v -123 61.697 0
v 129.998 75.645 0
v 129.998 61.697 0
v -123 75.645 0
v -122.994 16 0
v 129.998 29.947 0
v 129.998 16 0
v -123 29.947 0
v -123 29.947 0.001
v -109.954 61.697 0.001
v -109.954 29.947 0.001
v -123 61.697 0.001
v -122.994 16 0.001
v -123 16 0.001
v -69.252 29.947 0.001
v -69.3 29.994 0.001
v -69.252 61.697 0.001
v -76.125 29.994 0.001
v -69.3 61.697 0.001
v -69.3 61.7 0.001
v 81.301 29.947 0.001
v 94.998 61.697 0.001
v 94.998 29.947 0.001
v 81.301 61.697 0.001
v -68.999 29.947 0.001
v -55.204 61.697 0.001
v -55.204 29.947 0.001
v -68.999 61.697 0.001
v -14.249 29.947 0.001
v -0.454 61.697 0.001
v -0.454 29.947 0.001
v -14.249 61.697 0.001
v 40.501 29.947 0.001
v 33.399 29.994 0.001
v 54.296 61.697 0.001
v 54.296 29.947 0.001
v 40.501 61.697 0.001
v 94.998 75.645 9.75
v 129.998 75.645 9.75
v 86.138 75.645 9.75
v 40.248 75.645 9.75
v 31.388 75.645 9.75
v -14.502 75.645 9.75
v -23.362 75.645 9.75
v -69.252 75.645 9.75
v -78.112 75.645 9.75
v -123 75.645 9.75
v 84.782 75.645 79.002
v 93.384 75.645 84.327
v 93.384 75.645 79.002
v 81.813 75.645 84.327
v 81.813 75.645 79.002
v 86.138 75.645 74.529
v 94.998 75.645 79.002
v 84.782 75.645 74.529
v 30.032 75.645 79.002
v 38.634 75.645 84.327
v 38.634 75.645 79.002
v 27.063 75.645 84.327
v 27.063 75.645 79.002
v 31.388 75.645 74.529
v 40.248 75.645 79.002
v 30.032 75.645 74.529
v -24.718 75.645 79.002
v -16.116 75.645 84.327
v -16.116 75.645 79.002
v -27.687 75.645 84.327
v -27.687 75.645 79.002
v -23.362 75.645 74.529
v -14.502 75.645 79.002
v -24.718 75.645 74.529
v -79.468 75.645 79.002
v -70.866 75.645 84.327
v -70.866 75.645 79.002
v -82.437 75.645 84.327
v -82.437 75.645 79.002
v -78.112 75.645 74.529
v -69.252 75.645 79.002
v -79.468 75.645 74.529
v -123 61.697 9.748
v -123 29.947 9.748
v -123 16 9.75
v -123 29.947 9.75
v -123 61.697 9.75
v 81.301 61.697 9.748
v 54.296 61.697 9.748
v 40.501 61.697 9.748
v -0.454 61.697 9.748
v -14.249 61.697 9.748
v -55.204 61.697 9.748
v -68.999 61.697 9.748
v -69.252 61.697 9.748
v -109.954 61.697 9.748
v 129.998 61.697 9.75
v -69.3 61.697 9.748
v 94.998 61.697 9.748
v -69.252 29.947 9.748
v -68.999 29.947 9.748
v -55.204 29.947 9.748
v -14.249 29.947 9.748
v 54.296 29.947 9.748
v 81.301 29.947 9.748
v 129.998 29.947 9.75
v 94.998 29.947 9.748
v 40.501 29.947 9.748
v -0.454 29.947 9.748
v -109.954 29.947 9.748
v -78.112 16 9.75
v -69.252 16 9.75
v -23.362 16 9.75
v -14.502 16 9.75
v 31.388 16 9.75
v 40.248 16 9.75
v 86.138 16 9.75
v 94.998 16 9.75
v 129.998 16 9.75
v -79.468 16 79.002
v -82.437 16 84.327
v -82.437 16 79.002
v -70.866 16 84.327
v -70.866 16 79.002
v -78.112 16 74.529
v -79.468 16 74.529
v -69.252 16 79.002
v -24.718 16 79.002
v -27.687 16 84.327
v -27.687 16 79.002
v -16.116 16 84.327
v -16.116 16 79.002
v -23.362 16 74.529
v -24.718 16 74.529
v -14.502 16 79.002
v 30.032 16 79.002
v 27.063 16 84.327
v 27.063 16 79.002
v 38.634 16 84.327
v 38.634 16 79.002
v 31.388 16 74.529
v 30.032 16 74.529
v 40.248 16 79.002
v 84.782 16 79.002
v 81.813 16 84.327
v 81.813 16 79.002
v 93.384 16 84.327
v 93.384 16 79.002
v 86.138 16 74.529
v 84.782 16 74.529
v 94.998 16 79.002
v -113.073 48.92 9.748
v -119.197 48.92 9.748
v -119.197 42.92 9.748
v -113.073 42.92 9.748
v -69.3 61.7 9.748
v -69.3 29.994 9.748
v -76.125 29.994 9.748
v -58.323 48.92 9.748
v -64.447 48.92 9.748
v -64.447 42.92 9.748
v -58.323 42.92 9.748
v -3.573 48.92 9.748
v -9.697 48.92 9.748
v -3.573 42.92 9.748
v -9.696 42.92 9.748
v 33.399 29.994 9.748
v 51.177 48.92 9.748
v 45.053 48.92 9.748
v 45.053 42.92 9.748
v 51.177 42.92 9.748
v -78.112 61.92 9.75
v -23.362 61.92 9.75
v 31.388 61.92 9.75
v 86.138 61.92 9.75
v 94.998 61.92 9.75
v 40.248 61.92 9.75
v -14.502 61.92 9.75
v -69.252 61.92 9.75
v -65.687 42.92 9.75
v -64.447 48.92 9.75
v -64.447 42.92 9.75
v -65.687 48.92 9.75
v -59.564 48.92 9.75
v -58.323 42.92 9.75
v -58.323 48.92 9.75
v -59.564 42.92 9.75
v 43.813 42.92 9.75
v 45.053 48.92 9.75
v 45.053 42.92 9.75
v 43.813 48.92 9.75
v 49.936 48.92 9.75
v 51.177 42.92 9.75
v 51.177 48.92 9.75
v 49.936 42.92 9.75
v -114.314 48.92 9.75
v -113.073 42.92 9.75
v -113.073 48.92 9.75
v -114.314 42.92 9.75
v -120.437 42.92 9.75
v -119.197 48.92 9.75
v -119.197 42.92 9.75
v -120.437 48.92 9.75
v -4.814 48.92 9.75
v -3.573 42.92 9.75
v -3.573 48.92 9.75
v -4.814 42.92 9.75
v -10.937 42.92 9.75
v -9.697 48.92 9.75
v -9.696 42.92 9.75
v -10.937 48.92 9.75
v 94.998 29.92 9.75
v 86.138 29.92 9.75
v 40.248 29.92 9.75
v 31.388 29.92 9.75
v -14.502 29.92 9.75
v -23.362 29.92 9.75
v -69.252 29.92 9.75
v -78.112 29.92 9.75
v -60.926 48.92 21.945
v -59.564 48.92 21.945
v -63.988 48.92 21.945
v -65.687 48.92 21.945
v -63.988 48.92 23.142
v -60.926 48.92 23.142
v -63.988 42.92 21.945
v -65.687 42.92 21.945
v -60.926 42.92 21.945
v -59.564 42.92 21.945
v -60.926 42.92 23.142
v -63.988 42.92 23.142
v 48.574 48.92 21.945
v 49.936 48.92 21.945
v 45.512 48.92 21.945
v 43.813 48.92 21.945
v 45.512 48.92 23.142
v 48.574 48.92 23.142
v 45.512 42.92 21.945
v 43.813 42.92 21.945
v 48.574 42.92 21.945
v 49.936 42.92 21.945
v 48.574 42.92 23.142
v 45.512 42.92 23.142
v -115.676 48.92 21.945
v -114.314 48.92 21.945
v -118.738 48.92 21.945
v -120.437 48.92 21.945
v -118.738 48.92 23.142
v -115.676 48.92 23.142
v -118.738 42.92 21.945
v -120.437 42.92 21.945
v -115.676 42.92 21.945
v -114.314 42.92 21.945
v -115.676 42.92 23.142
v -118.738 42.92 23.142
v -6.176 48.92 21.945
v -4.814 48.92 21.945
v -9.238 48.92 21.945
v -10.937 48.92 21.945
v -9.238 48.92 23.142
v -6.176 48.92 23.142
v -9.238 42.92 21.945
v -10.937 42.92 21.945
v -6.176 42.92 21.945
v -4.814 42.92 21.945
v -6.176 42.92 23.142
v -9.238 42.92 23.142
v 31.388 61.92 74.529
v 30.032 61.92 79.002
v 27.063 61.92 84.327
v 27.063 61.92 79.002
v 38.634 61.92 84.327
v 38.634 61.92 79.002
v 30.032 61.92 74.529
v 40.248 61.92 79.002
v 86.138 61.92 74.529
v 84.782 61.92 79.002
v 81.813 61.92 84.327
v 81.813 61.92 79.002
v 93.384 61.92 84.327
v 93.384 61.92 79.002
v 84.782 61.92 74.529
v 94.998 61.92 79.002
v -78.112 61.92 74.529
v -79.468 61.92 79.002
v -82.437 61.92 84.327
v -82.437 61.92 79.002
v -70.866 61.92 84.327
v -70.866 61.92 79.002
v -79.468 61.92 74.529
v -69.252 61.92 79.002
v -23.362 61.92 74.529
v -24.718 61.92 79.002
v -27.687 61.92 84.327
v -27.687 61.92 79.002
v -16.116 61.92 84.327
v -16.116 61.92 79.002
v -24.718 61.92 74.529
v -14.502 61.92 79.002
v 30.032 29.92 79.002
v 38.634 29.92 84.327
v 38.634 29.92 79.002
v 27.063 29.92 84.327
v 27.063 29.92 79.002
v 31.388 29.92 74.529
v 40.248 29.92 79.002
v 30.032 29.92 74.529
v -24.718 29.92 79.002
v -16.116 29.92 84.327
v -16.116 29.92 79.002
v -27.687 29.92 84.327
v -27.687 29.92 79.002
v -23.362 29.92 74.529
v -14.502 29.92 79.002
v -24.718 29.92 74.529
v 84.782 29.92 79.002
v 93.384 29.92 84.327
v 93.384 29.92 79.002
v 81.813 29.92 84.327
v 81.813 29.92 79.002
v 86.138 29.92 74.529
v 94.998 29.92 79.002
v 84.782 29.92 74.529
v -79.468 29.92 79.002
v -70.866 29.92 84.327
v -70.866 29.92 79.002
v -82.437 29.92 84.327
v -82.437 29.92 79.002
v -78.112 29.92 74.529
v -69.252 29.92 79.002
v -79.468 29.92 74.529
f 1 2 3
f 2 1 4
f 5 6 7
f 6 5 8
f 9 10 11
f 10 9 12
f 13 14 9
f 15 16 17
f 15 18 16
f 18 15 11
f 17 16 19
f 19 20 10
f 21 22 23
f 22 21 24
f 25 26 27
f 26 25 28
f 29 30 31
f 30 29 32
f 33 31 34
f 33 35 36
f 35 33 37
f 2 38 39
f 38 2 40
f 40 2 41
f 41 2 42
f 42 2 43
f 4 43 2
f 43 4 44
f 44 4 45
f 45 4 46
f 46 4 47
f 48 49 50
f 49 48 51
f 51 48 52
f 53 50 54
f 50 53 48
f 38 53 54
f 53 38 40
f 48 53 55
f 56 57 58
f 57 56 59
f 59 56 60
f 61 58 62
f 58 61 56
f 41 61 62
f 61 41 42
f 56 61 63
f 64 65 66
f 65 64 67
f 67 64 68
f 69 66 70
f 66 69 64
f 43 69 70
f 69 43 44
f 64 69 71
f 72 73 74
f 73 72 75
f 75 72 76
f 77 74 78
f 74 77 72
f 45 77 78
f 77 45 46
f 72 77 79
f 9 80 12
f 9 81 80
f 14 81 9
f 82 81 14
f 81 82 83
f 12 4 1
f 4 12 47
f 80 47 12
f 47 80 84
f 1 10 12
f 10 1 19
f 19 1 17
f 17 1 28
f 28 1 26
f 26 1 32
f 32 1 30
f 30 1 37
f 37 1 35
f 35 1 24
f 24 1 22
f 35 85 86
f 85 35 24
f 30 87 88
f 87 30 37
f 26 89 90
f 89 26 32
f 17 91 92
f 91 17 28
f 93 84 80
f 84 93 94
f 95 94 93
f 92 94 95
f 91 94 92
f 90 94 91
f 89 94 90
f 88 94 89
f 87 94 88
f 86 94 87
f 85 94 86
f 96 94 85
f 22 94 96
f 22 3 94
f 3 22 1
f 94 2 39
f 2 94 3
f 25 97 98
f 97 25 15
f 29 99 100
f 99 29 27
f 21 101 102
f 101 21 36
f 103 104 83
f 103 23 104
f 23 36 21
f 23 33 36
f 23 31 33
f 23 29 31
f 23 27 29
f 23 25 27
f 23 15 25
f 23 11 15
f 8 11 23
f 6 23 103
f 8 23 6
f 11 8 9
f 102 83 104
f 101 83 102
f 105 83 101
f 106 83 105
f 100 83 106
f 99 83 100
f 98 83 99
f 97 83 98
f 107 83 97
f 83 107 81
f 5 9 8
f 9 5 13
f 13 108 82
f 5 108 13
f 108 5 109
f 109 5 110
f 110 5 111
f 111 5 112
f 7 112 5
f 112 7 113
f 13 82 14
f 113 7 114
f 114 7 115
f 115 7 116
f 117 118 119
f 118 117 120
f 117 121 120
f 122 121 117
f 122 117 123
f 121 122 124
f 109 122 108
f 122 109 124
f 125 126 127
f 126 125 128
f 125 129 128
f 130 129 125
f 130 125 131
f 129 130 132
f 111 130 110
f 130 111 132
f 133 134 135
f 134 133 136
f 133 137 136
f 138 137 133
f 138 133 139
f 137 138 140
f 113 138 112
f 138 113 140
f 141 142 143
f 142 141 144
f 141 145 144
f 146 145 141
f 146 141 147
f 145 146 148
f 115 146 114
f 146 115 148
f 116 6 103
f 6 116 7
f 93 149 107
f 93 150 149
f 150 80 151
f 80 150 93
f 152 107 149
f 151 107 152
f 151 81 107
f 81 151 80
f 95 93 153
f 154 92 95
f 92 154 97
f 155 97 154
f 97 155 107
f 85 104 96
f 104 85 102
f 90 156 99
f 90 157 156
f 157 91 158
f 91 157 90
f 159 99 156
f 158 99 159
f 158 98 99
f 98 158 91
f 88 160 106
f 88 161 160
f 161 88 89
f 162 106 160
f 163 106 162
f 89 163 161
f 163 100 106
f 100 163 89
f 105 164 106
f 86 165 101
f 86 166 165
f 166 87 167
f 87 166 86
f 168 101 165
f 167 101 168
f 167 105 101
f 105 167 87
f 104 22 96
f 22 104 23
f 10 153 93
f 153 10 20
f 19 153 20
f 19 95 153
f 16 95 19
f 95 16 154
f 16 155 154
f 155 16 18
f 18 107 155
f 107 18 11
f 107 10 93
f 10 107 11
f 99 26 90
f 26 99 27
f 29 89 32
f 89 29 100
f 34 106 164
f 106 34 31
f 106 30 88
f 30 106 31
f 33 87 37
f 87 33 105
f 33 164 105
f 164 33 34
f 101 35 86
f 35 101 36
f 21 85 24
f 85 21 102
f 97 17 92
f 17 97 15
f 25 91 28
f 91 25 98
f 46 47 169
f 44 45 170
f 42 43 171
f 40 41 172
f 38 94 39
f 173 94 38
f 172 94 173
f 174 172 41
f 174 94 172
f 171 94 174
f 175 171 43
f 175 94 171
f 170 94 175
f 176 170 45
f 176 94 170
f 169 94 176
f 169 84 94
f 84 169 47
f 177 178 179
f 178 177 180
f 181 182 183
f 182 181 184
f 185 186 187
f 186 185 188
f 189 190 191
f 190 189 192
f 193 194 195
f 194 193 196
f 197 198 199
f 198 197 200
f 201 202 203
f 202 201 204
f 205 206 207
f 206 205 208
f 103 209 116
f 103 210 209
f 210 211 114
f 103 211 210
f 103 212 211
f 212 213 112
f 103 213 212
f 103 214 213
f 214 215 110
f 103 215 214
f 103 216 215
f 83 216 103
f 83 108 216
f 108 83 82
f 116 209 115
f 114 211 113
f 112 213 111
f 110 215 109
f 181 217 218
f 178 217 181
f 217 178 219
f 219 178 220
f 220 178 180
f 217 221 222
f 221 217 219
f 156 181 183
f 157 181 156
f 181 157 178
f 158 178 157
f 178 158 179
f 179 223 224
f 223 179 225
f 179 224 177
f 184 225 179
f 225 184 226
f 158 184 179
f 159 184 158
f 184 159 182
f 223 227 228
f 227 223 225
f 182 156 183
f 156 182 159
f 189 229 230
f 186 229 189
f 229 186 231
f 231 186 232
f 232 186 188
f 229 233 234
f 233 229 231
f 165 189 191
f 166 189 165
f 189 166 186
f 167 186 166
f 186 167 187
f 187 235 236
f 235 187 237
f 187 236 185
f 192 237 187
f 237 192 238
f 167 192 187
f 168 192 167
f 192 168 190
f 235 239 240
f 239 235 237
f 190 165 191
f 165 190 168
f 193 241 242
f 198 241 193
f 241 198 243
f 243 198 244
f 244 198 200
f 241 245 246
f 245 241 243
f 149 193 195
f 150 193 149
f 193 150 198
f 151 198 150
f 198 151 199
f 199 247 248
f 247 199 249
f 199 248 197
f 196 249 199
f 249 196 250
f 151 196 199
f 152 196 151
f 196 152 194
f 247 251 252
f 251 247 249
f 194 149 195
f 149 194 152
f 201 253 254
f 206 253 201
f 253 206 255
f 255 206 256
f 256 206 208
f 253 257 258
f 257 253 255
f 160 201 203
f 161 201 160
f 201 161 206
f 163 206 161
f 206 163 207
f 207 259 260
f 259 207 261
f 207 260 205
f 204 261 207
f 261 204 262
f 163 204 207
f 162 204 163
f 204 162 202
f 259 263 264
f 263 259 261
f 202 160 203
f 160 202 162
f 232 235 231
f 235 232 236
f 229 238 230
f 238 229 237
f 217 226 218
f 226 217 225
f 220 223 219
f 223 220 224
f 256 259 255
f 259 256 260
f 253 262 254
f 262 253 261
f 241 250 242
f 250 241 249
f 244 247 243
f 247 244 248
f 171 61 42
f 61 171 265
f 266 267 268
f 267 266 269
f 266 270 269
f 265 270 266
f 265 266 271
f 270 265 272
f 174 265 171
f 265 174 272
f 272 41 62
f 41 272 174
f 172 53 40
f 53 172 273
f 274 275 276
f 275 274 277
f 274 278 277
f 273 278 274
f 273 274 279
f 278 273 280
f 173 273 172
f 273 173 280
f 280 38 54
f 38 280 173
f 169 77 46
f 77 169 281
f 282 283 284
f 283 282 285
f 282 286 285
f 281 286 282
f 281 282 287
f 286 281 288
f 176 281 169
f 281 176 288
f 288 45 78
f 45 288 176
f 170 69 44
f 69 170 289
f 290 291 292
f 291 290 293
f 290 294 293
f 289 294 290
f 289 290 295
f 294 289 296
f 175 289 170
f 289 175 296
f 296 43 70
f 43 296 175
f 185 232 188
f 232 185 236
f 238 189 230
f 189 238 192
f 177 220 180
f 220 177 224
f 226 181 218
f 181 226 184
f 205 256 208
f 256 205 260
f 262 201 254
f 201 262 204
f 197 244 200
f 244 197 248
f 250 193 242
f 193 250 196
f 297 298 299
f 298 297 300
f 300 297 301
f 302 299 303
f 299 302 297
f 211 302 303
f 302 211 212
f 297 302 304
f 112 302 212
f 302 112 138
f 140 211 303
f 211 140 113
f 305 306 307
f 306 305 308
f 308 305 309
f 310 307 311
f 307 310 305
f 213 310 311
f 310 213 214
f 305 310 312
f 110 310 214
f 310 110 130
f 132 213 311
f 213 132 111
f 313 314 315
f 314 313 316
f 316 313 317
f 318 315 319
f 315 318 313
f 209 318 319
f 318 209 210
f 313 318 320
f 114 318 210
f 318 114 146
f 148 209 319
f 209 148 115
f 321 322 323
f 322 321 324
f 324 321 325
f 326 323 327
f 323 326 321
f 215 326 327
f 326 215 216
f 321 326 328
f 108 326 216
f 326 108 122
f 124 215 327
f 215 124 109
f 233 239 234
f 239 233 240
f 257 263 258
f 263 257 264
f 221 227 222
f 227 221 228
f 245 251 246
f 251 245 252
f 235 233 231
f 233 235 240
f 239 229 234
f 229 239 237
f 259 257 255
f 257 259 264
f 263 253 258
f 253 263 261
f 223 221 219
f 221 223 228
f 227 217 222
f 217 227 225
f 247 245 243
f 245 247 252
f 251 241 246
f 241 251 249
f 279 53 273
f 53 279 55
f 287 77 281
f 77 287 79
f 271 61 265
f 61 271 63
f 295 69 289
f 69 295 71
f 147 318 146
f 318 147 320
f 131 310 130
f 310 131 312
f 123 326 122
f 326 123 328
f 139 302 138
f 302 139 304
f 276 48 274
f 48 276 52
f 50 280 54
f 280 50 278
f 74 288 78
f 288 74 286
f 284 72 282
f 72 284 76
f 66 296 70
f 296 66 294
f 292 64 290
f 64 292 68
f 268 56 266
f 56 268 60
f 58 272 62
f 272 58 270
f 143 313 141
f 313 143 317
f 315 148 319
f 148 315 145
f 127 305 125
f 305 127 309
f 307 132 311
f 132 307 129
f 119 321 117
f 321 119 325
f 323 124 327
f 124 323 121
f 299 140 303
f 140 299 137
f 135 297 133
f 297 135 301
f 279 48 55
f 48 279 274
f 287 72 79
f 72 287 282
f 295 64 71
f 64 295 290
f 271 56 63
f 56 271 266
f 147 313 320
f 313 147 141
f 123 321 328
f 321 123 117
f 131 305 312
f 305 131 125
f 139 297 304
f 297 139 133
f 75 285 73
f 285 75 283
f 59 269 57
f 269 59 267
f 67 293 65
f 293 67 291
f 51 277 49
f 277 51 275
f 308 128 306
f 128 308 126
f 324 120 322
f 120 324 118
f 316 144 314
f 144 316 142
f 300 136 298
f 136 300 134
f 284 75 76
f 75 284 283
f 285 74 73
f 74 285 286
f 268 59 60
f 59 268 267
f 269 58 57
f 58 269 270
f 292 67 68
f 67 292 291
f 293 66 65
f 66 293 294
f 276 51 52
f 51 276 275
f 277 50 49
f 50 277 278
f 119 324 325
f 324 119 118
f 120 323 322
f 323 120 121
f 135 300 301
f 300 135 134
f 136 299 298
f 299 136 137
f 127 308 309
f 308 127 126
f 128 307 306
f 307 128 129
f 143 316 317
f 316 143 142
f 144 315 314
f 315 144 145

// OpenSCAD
// Auto reverse-engineered from STL into layered parametric OpenSCAD
// This rebuild uses cross-section polygons between Z levels and extrudes each slab.

z_levels = [-0.000000, 0.001000, 9.748000, 9.750000, 21.945000, 23.142000, 74.529000, 79.001600, 84.327000, 87.549000];

module top_parametric(z=z_levels) {
  union() {
    // slab 0: z=-0.000000..0.001000
    translate([0,0,-0.000000]) linear_extrude(height=0.001000) union() {
      // slab 0 poly 0
      polygon(points=[
          [20.293919, 61.696999],
          [129.997986, 61.696999],
          [129.997986, 75.644997],
          [-123.000008, 75.644997],
          [-123.000008, 61.696999]
      ], paths=[
          [0, 1, 2, 3, 4]
      ]);
      // slab 0 poly 1
      polygon(points=[
          [-122.994424, 15.999999],
          [129.997986, 15.999999],
          [129.997986, 29.946999],
          [-123.000008, 29.946999]
      ], paths=[
          [0, 1, 2, 3]
      ]);
    }
    // slab 1: z=0.001000..9.748000
    translate([0,0,0.001000]) linear_extrude(height=9.747000) union() {
      // slab 1 poly 0
      polygon(points=[
          [-123.000008, 68.670280],
          [-123.000008, 15.999999],
          [129.997986, 15.999999],
          [129.997986, 29.946999],
          [94.997986, 29.946999],
          [94.997986, 61.696999],
          [129.997986, 61.696999],
          [129.997986, 75.644997],
          [-123.000008, 75.644997],
          [-34.505024, 61.696999],
          [-55.204014, 61.696999],
          [-55.204014, 29.946999],
          [-14.249004, 29.946999],
          [-14.249004, 61.696999],
          [33.399488, 29.993999],
          [40.500984, 29.946999],
          [40.500984, 61.696999],
          [-0.454014, 61.696999],
          [-0.454014, 29.946999],
          [-76.124513, 29.993999],
          [-69.300011, 29.993999],
          [-69.300011, 61.699997],
          [-109.954018, 61.696999],
          [-109.954018, 29.946999],
          [63.978926, 61.696999],
          [54.295986, 61.696999],
          [54.295986, 29.946999],
          [81.300987, 29.946999],
          [81.300987, 61.696999],
          [-68.999001, 61.696999],
          [-69.252014, 61.696999],
          [-69.252014, 29.946999],
          [-68.999001, 29.946999]
      ], paths=[
          [0, 1, 2, 3, 4, 5, 6, 7, 8],
          [9, 10, 11, 12, 13],
          [14, 15, 16, 17, 18],
          [19, 20, 21, 22, 23],
          [24, 25, 26, 27, 28],
          [29, 30, 31, 32]
      ]);
    }
    // slab 2: z=9.748000..9.750000
    translate([0,0,9.748000]) linear_extrude(height=0.002000) union() {
      // slab 2 poly 0
      polygon(points=[
          [-34.505024, 61.696999],
          [129.997986, 61.696999],
          [129.997986, 75.644997],
          [-123.000008, 75.644997],
          [-123.000008, 61.696999]
      ], paths=[
          [0, 1, 2, 3, 4]
      ]);
      // slab 2 poly 1
      polygon(points=[
          [-63.651517, 29.946999],
          [-123.000008, 29.946999],
          [-123.000008, 15.999999],
          [129.997986, 15.999999],
          [129.997986, 29.946999]
      ], paths=[
          [0, 1, 2, 3, 4]
      ]);
      // slab 2 poly 2
      polygon(points=[
          [-64.446630, 42.919998],
          [-58.323427, 42.919998],
          [-58.323427, 48.919998],
          [-64.446630, 48.919998]
      ], paths=[
          [0, 1, 2, 3]
      ]);
      // slab 2 poly 3
      polygon(points=[
          [45.053381, 42.919998],
          [51.176573, 42.919998],
          [51.176573, 48.919998],
          [45.053381, 48.919998]
      ], paths=[
          [0, 1, 2, 3]
      ]);
      // slab 2 poly 4
      polygon(points=[
          [-113.073431, 42.919998],
          [-113.073431, 48.919998],
          [-119.196615, 48.919998],
          [-119.196615, 42.919998]
      ], paths=[
          [0, 1, 2, 3]
      ]);
      // slab 2 poly 5
      polygon(points=[
          [-9.696170, 42.919998],
          [-3.573428, 42.919998],
          [-3.573428, 48.919998],
          [-9.696628, 48.919998]
      ], paths=[
          [0, 1, 2, 3]
      ]);
    }
    // slab 3: z=9.750000..21.945000
    translate([0,0,9.750000]) linear_extrude(height=12.195000) union() {
      // slab 3 poly 0
      polygon(points=[
          [39.414014, 29.919998],
          [31.387985, 29.919998],
          [31.387985, 15.999999],
          [40.247986, 15.999999],
          [40.247986, 29.919998]
      ], paths=[
          [0, 1, 2, 3, 4]
      ]);
      // slab 3 poly 1
      polygon(points=[
          [-15.335986, 29.919998],
          [-23.362015, 29.919998],
          [-23.362015, 15.999999],
          [-14.502014, 15.999999],
          [-14.502014, 29.919998]
      ], paths=[
          [0, 1, 2, 3, 4]
      ]);
      // slab 3 poly 2
      polygon(points=[
          [94.997986, 29.919998],
          [86.137985, 29.919998],
          [86.137985, 15.999999],
          [94.997986, 15.999999]
      ], paths=[
          [0, 1, 2, 3]
      ]);
      // slab 3 poly 3
      polygon(points=[
          [-78.112015, 29.919998],
          [-78.112015, 15.999999],
          [-69.252014, 15.999999],
          [-69.252014, 29.919998]
      ], paths=[
          [0, 1, 2, 3]
      ]);
      // slab 3 poly 4
      polygon(points=[
          [39.414014, 61.919998],
          [40.247986, 61.919998],
          [40.247986, 75.644997],
          [31.387985, 75.644997],
          [31.387985, 61.919998]
      ], paths=[
          [0, 1, 2, 3, 4]
      ]);
      // slab 3 poly 5
      polygon(points=[
          [94.997986, 61.919998],
          [94.997986, 75.644997],
          [86.137985, 75.644997],
          [86.137985, 61.919998]
      ], paths=[
          [0, 1, 2, 3]
      ]);
      // slab 3 poly 6
      polygon(points=[
          [-78.112015, 74.353093],
          [-78.112015, 61.919998],
          [-69.252014, 61.919998],
          [-69.252014, 75.644997],
          [-78.112015, 75.644997]
      ], paths=[
          [0, 1, 2, 3, 4]
      ]);
      // slab 3 poly 7
      polygon(points=[
          [-15.335986, 61.919998],
          [-14.502014, 61.919998],
          [-14.502014, 75.644997],
          [-23.362015, 75.644997],
          [-23.362015, 61.919998]
      ], paths=[
          [0, 1, 2, 3, 4]
      ]);
      // slab 3 poly 8
      polygon(points=[
          [49.935932, 45.652342],
          [49.935932, 48.919998],
          [43.812582, 48.919998],
          [43.812582, 42.919998],
          [49.935932, 42.919998]
      ], paths=[
          [0, 1, 2, 3, 4]
      ]);
      // slab 3 poly 9
      polygon(points=[
          [-62.898826, 42.919998],
          [-59.564071, 42.919998],
          [-59.564071, 48.919998],
          [-65.687418, 48.919998],
          [-65.687418, 42.919998]
      ], paths=[
          [0, 1, 2, 3, 4]
      ]);
      // slab 3 poly 10
      polygon(points=[
          [-10.937418, 42.919998],
          [-4.814072, 42.919998],
          [-4.814072, 48.919998],
          [-10.937418, 48.919998]
      ], paths=[
          [0, 1, 2, 3]
      ]);
      // slab 3 poly 11
      polygon(points=[
          [-117.648819, 42.919998],
          [-114.314075, 42.919998],
          [-114.314075, 48.919998],
          [-120.437410, 48.919998],
          [-120.437410, 42.919998]
      ], paths=[
          [0, 1, 2, 3, 4]
      ]);
    }
    // slab 4: z=21.945000..23.142000
    translate([0,0,21.945000]) linear_extrude(height=1.197000) union() {
      // slab 4 poly 0
      polygon(points=[
          [-16.251816, 29.919998],
          [-23.362015, 29.919998],
          [-23.362015, 15.999999],
          [-14.502014, 15.999999],
          [-14.502014, 29.919998]
      ], paths=[
          [0, 1, 2, 3, 4]
      ]);
      // slab 4 poly 1
      polygon(points=[
          [38.498184, 29.919998],
          [31.387985, 29.919998],
          [31.387985, 15.999999],
          [40.247986, 15.999999],
          [40.247986, 29.919998]
      ], paths=[
          [0, 1, 2, 3, 4]
      ]);
      // slab 4 poly 2
      polygon(points=[
          [94.997986, 29.919998],
          [86.137985, 29.919998],
          [86.137985, 15.999999],
          [94.997986, 15.999999]
      ], paths=[
          [0, 1, 2, 3]
      ]);
      // slab 4 poly 3
      polygon(points=[
          [-78.112015, 29.919998],
          [-78.112015, 15.999999],
          [-69.252014, 15.999999],
          [-69.252014, 29.919998]
      ], paths=[
          [0, 1, 2, 3]
      ]);
      // slab 4 poly 4
      polygon(points=[
          [38.498184, 61.919998],
          [40.247986, 61.919998],
          [40.247986, 75.644997],
          [31.387985, 75.644997],
          [31.387985, 61.919998]
      ], paths=[
          [0, 1, 2, 3, 4]
      ]);
      // slab 4 poly 5
      polygon(points=[
          [94.997986, 64.455545],
          [94.997986, 75.644997],
          [86.137985, 75.644997],
          [86.137985, 61.919998],
          [94.997986, 61.919998]
      ], paths=[
          [0, 1, 2, 3, 4]
      ]);
      // slab 4 poly 6
      polygon(points=[
          [-78.112015, 61.919998],
          [-69.252014, 61.919998],
          [-69.252014, 75.644997],
          [-78.112015, 75.644997]
      ], paths=[
          [0, 1, 2, 3]
      ]);
      // slab 4 poly 7
      polygon(points=[
          [-16.251816, 61.919998],
          [-14.502014, 61.919998],
          [-14.502014, 75.644997],
          [-23.362015, 75.644997],
          [-23.362015, 61.919998]
      ], paths=[
          [0, 1, 2, 3, 4]
      ]);
      // slab 4 poly 8
      polygon(points=[
          [45.511995, 45.920008],
          [45.511995, 42.919998],
          [48.573739, 42.919998],
          [48.573739, 48.919998],
          [45.511995, 48.919998]
      ], paths=[
          [0, 1, 2, 3, 4]
      ]);
      // slab 4 poly 9
      polygon(points=[
          [-6.449878, 42.919998],
          [-6.176269, 42.919998],
          [-6.176269, 48.919998],
          [-9.238005, 48.919998],
          [-9.238005, 42.919998]
      ], paths=[
          [0, 1, 2, 3, 4]
      ]);
      // slab 4 poly 10
      polygon(points=[
          [-63.988003, 45.920008],
          [-63.988003, 42.919998],
          [-60.926268, 42.919998],
          [-60.926268, 48.919998],
          [-63.988003, 48.919998]
      ], paths=[
          [0, 1, 2, 3, 4]
      ]);
      // slab 4 poly 11
      polygon(points=[
          [-115.676272, 48.651894],
          [-115.676272, 48.919998],
          [-118.738005, 48.919998],
          [-118.738005, 42.919998],
          [-115.676272, 42.919998]
      ], paths=[
          [0, 1, 2, 3, 4]
      ]);
    }
    // slab 5: z=23.142000..74.529000
    translate([0,0,23.142000]) linear_extrude(height=51.387000) union() {
      // slab 5 poly 0
      polygon(points=[
          [89.652155, 29.919998],
          [86.137985, 29.919998],
          [86.137985, 15.999999],
          [94.997986, 15.999999],
          [94.997986, 29.919998]
      ], paths=[
          [0, 1, 2, 3, 4]
      ]);
      // slab 5 poly 1
      polygon(points=[
          [-78.112015, 21.521132],
          [-78.112015, 15.999999],
          [-69.252014, 15.999999],
          [-69.252014, 29.919998],
          [-78.112015, 29.919998]
      ], paths=[
          [0, 1, 2, 3, 4]
      ]);
      // slab 5 poly 2
      polygon(points=[
          [34.902155, 29.919998],
          [31.387985, 29.919998],
          [31.387985, 15.999999],
          [40.247986, 15.999999],
          [40.247986, 29.919998]
      ], paths=[
          [0, 1, 2, 3, 4]
      ]);
      // slab 5 poly 3
      polygon(points=[
          [-19.847845, 29.919998],
          [-23.362015, 29.919998],
          [-23.362015, 15.999999],
          [-14.502014, 15.999999],
          [-14.502014, 29.919998]
      ], paths=[
          [0, 1, 2, 3, 4]
      ]);
      // slab 5 poly 4
      polygon(points=[
          [89.652155, 61.919998],
          [94.997986, 61.919998],
          [94.997986, 75.644997],
          [86.137985, 75.644997],
          [86.137985, 61.919998]
      ], paths=[
          [0, 1, 2, 3, 4]
      ]);
      // slab 5 poly 5
      polygon(points=[
          [-78.112015, 61.919998],
          [-69.252014, 61.919998],
          [-69.252014, 75.644997],
          [-78.112015, 75.644997]
      ], paths=[
          [0, 1, 2, 3]
      ]);
      // slab 5 poly 6
      polygon(points=[
          [34.902155, 61.919998],
          [40.247986, 61.919998],
          [40.247986, 75.644997],
          [31.387985, 75.644997],
          [31.387985, 61.919998]
      ], paths=[
          [0, 1, 2, 3, 4]
      ]);
      // slab 5 poly 7
      polygon(points=[
          [-19.847845, 61.919998],
          [-14.502014, 61.919998],
          [-14.502014, 75.644997],
          [-23.362015, 75.644997],
          [-23.362015, 61.919998]
      ], paths=[
          [0, 1, 2, 3, 4]
      ]);
    }
    // slab 6: z=74.529000..79.001600
    translate([0,0,74.529000]) linear_extrude(height=4.472600) union() {
      // slab 6 poly 0
      polygon(points=[
          [90.567939, 29.919998],
          [84.782464, 29.919998],
          [84.782464, 15.999999],
          [94.997986, 15.999999],
          [94.997986, 29.919998]
      ], paths=[
          [0, 1, 2, 3, 4]
      ]);
      // slab 6 poly 1
      polygon(points=[
          [-79.467536, 29.919998],
          [-79.467536, 15.999999],
          [-69.252014, 15.999999],
          [-69.252014, 29.919998]
      ], paths=[
          [0, 1, 2, 3]
      ]);
      // slab 6 poly 2
      polygon(points=[
          [-18.932061, 29.919998],
          [-24.717536, 29.919998],
          [-24.717536, 15.999999],
          [-14.502014, 15.999999],
          [-14.502014, 29.919998]
      ], paths=[
          [0, 1, 2, 3, 4]
      ]);
      // slab 6 poly 3
      polygon(points=[
          [35.817939, 29.919998],
          [30.032464, 29.919998],
          [30.032464, 15.999999],
          [40.247986, 15.999999],
          [40.247986, 29.919998]
      ], paths=[
          [0, 1, 2, 3, 4]
      ]);
      // slab 6 poly 4
      polygon(points=[
          [90.567939, 61.919998],
          [94.997986, 61.919998],
          [94.997986, 75.644997],
          [84.782464, 75.644997],
          [84.782464, 61.919998]
      ], paths=[
          [0, 1, 2, 3, 4]
      ]);
      // slab 6 poly 5
      polygon(points=[
          [-79.467536, 61.919998],
          [-69.252014, 61.919998],
          [-69.252014, 75.644997],
          [-79.467536, 75.644997]
      ], paths=[
          [0, 1, 2, 3]
      ]);
      // slab 6 poly 6
      polygon(points=[
          [-18.932061, 61.919998],
          [-14.502014, 61.919998],
          [-14.502014, 75.644997],
          [-24.717536, 75.644997],
          [-24.717536, 61.919998]
      ], paths=[
          [0, 1, 2, 3, 4]
      ]);
      // slab 6 poly 7
      polygon(points=[
          [35.817939, 61.919998],
          [40.247986, 61.919998],
          [40.247986, 75.644997],
          [30.032464, 75.644997],
          [30.032464, 61.919998]
      ], paths=[
          [0, 1, 2, 3, 4]
      ]);
    }
    // slab 7: z=79.001600..84.327000
    translate([0,0,79.001600]) linear_extrude(height=5.325400) union() {
      // slab 7 poly 0
      polygon(points=[
          [-76.095416, 15.999999],
          [-70.865755, 15.999999],
          [-70.865755, 29.919998],
          [-82.437039, 29.919998],
          [-82.437039, 15.999999]
      ], paths=[
          [0, 1, 2, 3, 4]
      ]);
      // slab 7 poly 1
      polygon(points=[
          [38.634246, 20.336328],
          [38.634246, 29.919998],
          [27.062964, 29.919998],
          [27.062964, 15.999999],
          [38.634246, 15.999999]
      ], paths=[
          [0, 1, 2, 3, 4]
      ]);
      // slab 7 poly 2
      polygon(points=[
          [-18.503779, 29.919998],
          [-27.687036, 29.919998],
          [-27.687036, 15.999999],
          [-16.115755, 15.999999],
          [-16.115755, 29.919998]
      ], paths=[
          [0, 1, 2, 3, 4]
      ]);
      // slab 7 poly 3
      polygon(points=[
          [90.996219, 29.919998],
          [81.812961, 29.919998],
          [81.812961, 15.999999],
          [93.384242, 15.999999],
          [93.384242, 29.919998]
      ], paths=[
          [0, 1, 2, 3, 4]
      ]);
      // slab 7 poly 4
      polygon(points=[
          [-76.095416, 75.644997],
          [-82.437039, 75.644997],
          [-82.437039, 61.919998],
          [-70.865755, 61.919998],
          [-70.865755, 75.644997]
      ], paths=[
          [0, 1, 2, 3, 4]
      ]);
      // slab 7 poly 5
      polygon(points=[
          [38.634246, 71.369414],
          [38.634246, 75.644997],
          [27.062964, 75.644997],
          [27.062964, 61.919998],
          [38.634246, 61.919998]
      ], paths=[
          [0, 1, 2, 3, 4]
      ]);
      // slab 7 poly 6
      polygon(points=[
          [-18.503779, 75.644997],
          [-27.687036, 75.644997],
          [-27.687036, 61.919998],
          [-16.115755, 61.919998],
          [-16.115755, 75.644997]
      ], paths=[
          [0, 1, 2, 3, 4]
      ]);
      // slab 7 poly 7
      polygon(points=[
          [83.953540, 61.919998],
          [93.384242, 61.919998],
          [93.384242, 75.644997],
          [81.812961, 75.644997],
          [81.812961, 61.919998]
      ], paths=[
          [0, 1, 2, 3, 4]
      ]);
    }
  }
}

// Render
top_parametric();
